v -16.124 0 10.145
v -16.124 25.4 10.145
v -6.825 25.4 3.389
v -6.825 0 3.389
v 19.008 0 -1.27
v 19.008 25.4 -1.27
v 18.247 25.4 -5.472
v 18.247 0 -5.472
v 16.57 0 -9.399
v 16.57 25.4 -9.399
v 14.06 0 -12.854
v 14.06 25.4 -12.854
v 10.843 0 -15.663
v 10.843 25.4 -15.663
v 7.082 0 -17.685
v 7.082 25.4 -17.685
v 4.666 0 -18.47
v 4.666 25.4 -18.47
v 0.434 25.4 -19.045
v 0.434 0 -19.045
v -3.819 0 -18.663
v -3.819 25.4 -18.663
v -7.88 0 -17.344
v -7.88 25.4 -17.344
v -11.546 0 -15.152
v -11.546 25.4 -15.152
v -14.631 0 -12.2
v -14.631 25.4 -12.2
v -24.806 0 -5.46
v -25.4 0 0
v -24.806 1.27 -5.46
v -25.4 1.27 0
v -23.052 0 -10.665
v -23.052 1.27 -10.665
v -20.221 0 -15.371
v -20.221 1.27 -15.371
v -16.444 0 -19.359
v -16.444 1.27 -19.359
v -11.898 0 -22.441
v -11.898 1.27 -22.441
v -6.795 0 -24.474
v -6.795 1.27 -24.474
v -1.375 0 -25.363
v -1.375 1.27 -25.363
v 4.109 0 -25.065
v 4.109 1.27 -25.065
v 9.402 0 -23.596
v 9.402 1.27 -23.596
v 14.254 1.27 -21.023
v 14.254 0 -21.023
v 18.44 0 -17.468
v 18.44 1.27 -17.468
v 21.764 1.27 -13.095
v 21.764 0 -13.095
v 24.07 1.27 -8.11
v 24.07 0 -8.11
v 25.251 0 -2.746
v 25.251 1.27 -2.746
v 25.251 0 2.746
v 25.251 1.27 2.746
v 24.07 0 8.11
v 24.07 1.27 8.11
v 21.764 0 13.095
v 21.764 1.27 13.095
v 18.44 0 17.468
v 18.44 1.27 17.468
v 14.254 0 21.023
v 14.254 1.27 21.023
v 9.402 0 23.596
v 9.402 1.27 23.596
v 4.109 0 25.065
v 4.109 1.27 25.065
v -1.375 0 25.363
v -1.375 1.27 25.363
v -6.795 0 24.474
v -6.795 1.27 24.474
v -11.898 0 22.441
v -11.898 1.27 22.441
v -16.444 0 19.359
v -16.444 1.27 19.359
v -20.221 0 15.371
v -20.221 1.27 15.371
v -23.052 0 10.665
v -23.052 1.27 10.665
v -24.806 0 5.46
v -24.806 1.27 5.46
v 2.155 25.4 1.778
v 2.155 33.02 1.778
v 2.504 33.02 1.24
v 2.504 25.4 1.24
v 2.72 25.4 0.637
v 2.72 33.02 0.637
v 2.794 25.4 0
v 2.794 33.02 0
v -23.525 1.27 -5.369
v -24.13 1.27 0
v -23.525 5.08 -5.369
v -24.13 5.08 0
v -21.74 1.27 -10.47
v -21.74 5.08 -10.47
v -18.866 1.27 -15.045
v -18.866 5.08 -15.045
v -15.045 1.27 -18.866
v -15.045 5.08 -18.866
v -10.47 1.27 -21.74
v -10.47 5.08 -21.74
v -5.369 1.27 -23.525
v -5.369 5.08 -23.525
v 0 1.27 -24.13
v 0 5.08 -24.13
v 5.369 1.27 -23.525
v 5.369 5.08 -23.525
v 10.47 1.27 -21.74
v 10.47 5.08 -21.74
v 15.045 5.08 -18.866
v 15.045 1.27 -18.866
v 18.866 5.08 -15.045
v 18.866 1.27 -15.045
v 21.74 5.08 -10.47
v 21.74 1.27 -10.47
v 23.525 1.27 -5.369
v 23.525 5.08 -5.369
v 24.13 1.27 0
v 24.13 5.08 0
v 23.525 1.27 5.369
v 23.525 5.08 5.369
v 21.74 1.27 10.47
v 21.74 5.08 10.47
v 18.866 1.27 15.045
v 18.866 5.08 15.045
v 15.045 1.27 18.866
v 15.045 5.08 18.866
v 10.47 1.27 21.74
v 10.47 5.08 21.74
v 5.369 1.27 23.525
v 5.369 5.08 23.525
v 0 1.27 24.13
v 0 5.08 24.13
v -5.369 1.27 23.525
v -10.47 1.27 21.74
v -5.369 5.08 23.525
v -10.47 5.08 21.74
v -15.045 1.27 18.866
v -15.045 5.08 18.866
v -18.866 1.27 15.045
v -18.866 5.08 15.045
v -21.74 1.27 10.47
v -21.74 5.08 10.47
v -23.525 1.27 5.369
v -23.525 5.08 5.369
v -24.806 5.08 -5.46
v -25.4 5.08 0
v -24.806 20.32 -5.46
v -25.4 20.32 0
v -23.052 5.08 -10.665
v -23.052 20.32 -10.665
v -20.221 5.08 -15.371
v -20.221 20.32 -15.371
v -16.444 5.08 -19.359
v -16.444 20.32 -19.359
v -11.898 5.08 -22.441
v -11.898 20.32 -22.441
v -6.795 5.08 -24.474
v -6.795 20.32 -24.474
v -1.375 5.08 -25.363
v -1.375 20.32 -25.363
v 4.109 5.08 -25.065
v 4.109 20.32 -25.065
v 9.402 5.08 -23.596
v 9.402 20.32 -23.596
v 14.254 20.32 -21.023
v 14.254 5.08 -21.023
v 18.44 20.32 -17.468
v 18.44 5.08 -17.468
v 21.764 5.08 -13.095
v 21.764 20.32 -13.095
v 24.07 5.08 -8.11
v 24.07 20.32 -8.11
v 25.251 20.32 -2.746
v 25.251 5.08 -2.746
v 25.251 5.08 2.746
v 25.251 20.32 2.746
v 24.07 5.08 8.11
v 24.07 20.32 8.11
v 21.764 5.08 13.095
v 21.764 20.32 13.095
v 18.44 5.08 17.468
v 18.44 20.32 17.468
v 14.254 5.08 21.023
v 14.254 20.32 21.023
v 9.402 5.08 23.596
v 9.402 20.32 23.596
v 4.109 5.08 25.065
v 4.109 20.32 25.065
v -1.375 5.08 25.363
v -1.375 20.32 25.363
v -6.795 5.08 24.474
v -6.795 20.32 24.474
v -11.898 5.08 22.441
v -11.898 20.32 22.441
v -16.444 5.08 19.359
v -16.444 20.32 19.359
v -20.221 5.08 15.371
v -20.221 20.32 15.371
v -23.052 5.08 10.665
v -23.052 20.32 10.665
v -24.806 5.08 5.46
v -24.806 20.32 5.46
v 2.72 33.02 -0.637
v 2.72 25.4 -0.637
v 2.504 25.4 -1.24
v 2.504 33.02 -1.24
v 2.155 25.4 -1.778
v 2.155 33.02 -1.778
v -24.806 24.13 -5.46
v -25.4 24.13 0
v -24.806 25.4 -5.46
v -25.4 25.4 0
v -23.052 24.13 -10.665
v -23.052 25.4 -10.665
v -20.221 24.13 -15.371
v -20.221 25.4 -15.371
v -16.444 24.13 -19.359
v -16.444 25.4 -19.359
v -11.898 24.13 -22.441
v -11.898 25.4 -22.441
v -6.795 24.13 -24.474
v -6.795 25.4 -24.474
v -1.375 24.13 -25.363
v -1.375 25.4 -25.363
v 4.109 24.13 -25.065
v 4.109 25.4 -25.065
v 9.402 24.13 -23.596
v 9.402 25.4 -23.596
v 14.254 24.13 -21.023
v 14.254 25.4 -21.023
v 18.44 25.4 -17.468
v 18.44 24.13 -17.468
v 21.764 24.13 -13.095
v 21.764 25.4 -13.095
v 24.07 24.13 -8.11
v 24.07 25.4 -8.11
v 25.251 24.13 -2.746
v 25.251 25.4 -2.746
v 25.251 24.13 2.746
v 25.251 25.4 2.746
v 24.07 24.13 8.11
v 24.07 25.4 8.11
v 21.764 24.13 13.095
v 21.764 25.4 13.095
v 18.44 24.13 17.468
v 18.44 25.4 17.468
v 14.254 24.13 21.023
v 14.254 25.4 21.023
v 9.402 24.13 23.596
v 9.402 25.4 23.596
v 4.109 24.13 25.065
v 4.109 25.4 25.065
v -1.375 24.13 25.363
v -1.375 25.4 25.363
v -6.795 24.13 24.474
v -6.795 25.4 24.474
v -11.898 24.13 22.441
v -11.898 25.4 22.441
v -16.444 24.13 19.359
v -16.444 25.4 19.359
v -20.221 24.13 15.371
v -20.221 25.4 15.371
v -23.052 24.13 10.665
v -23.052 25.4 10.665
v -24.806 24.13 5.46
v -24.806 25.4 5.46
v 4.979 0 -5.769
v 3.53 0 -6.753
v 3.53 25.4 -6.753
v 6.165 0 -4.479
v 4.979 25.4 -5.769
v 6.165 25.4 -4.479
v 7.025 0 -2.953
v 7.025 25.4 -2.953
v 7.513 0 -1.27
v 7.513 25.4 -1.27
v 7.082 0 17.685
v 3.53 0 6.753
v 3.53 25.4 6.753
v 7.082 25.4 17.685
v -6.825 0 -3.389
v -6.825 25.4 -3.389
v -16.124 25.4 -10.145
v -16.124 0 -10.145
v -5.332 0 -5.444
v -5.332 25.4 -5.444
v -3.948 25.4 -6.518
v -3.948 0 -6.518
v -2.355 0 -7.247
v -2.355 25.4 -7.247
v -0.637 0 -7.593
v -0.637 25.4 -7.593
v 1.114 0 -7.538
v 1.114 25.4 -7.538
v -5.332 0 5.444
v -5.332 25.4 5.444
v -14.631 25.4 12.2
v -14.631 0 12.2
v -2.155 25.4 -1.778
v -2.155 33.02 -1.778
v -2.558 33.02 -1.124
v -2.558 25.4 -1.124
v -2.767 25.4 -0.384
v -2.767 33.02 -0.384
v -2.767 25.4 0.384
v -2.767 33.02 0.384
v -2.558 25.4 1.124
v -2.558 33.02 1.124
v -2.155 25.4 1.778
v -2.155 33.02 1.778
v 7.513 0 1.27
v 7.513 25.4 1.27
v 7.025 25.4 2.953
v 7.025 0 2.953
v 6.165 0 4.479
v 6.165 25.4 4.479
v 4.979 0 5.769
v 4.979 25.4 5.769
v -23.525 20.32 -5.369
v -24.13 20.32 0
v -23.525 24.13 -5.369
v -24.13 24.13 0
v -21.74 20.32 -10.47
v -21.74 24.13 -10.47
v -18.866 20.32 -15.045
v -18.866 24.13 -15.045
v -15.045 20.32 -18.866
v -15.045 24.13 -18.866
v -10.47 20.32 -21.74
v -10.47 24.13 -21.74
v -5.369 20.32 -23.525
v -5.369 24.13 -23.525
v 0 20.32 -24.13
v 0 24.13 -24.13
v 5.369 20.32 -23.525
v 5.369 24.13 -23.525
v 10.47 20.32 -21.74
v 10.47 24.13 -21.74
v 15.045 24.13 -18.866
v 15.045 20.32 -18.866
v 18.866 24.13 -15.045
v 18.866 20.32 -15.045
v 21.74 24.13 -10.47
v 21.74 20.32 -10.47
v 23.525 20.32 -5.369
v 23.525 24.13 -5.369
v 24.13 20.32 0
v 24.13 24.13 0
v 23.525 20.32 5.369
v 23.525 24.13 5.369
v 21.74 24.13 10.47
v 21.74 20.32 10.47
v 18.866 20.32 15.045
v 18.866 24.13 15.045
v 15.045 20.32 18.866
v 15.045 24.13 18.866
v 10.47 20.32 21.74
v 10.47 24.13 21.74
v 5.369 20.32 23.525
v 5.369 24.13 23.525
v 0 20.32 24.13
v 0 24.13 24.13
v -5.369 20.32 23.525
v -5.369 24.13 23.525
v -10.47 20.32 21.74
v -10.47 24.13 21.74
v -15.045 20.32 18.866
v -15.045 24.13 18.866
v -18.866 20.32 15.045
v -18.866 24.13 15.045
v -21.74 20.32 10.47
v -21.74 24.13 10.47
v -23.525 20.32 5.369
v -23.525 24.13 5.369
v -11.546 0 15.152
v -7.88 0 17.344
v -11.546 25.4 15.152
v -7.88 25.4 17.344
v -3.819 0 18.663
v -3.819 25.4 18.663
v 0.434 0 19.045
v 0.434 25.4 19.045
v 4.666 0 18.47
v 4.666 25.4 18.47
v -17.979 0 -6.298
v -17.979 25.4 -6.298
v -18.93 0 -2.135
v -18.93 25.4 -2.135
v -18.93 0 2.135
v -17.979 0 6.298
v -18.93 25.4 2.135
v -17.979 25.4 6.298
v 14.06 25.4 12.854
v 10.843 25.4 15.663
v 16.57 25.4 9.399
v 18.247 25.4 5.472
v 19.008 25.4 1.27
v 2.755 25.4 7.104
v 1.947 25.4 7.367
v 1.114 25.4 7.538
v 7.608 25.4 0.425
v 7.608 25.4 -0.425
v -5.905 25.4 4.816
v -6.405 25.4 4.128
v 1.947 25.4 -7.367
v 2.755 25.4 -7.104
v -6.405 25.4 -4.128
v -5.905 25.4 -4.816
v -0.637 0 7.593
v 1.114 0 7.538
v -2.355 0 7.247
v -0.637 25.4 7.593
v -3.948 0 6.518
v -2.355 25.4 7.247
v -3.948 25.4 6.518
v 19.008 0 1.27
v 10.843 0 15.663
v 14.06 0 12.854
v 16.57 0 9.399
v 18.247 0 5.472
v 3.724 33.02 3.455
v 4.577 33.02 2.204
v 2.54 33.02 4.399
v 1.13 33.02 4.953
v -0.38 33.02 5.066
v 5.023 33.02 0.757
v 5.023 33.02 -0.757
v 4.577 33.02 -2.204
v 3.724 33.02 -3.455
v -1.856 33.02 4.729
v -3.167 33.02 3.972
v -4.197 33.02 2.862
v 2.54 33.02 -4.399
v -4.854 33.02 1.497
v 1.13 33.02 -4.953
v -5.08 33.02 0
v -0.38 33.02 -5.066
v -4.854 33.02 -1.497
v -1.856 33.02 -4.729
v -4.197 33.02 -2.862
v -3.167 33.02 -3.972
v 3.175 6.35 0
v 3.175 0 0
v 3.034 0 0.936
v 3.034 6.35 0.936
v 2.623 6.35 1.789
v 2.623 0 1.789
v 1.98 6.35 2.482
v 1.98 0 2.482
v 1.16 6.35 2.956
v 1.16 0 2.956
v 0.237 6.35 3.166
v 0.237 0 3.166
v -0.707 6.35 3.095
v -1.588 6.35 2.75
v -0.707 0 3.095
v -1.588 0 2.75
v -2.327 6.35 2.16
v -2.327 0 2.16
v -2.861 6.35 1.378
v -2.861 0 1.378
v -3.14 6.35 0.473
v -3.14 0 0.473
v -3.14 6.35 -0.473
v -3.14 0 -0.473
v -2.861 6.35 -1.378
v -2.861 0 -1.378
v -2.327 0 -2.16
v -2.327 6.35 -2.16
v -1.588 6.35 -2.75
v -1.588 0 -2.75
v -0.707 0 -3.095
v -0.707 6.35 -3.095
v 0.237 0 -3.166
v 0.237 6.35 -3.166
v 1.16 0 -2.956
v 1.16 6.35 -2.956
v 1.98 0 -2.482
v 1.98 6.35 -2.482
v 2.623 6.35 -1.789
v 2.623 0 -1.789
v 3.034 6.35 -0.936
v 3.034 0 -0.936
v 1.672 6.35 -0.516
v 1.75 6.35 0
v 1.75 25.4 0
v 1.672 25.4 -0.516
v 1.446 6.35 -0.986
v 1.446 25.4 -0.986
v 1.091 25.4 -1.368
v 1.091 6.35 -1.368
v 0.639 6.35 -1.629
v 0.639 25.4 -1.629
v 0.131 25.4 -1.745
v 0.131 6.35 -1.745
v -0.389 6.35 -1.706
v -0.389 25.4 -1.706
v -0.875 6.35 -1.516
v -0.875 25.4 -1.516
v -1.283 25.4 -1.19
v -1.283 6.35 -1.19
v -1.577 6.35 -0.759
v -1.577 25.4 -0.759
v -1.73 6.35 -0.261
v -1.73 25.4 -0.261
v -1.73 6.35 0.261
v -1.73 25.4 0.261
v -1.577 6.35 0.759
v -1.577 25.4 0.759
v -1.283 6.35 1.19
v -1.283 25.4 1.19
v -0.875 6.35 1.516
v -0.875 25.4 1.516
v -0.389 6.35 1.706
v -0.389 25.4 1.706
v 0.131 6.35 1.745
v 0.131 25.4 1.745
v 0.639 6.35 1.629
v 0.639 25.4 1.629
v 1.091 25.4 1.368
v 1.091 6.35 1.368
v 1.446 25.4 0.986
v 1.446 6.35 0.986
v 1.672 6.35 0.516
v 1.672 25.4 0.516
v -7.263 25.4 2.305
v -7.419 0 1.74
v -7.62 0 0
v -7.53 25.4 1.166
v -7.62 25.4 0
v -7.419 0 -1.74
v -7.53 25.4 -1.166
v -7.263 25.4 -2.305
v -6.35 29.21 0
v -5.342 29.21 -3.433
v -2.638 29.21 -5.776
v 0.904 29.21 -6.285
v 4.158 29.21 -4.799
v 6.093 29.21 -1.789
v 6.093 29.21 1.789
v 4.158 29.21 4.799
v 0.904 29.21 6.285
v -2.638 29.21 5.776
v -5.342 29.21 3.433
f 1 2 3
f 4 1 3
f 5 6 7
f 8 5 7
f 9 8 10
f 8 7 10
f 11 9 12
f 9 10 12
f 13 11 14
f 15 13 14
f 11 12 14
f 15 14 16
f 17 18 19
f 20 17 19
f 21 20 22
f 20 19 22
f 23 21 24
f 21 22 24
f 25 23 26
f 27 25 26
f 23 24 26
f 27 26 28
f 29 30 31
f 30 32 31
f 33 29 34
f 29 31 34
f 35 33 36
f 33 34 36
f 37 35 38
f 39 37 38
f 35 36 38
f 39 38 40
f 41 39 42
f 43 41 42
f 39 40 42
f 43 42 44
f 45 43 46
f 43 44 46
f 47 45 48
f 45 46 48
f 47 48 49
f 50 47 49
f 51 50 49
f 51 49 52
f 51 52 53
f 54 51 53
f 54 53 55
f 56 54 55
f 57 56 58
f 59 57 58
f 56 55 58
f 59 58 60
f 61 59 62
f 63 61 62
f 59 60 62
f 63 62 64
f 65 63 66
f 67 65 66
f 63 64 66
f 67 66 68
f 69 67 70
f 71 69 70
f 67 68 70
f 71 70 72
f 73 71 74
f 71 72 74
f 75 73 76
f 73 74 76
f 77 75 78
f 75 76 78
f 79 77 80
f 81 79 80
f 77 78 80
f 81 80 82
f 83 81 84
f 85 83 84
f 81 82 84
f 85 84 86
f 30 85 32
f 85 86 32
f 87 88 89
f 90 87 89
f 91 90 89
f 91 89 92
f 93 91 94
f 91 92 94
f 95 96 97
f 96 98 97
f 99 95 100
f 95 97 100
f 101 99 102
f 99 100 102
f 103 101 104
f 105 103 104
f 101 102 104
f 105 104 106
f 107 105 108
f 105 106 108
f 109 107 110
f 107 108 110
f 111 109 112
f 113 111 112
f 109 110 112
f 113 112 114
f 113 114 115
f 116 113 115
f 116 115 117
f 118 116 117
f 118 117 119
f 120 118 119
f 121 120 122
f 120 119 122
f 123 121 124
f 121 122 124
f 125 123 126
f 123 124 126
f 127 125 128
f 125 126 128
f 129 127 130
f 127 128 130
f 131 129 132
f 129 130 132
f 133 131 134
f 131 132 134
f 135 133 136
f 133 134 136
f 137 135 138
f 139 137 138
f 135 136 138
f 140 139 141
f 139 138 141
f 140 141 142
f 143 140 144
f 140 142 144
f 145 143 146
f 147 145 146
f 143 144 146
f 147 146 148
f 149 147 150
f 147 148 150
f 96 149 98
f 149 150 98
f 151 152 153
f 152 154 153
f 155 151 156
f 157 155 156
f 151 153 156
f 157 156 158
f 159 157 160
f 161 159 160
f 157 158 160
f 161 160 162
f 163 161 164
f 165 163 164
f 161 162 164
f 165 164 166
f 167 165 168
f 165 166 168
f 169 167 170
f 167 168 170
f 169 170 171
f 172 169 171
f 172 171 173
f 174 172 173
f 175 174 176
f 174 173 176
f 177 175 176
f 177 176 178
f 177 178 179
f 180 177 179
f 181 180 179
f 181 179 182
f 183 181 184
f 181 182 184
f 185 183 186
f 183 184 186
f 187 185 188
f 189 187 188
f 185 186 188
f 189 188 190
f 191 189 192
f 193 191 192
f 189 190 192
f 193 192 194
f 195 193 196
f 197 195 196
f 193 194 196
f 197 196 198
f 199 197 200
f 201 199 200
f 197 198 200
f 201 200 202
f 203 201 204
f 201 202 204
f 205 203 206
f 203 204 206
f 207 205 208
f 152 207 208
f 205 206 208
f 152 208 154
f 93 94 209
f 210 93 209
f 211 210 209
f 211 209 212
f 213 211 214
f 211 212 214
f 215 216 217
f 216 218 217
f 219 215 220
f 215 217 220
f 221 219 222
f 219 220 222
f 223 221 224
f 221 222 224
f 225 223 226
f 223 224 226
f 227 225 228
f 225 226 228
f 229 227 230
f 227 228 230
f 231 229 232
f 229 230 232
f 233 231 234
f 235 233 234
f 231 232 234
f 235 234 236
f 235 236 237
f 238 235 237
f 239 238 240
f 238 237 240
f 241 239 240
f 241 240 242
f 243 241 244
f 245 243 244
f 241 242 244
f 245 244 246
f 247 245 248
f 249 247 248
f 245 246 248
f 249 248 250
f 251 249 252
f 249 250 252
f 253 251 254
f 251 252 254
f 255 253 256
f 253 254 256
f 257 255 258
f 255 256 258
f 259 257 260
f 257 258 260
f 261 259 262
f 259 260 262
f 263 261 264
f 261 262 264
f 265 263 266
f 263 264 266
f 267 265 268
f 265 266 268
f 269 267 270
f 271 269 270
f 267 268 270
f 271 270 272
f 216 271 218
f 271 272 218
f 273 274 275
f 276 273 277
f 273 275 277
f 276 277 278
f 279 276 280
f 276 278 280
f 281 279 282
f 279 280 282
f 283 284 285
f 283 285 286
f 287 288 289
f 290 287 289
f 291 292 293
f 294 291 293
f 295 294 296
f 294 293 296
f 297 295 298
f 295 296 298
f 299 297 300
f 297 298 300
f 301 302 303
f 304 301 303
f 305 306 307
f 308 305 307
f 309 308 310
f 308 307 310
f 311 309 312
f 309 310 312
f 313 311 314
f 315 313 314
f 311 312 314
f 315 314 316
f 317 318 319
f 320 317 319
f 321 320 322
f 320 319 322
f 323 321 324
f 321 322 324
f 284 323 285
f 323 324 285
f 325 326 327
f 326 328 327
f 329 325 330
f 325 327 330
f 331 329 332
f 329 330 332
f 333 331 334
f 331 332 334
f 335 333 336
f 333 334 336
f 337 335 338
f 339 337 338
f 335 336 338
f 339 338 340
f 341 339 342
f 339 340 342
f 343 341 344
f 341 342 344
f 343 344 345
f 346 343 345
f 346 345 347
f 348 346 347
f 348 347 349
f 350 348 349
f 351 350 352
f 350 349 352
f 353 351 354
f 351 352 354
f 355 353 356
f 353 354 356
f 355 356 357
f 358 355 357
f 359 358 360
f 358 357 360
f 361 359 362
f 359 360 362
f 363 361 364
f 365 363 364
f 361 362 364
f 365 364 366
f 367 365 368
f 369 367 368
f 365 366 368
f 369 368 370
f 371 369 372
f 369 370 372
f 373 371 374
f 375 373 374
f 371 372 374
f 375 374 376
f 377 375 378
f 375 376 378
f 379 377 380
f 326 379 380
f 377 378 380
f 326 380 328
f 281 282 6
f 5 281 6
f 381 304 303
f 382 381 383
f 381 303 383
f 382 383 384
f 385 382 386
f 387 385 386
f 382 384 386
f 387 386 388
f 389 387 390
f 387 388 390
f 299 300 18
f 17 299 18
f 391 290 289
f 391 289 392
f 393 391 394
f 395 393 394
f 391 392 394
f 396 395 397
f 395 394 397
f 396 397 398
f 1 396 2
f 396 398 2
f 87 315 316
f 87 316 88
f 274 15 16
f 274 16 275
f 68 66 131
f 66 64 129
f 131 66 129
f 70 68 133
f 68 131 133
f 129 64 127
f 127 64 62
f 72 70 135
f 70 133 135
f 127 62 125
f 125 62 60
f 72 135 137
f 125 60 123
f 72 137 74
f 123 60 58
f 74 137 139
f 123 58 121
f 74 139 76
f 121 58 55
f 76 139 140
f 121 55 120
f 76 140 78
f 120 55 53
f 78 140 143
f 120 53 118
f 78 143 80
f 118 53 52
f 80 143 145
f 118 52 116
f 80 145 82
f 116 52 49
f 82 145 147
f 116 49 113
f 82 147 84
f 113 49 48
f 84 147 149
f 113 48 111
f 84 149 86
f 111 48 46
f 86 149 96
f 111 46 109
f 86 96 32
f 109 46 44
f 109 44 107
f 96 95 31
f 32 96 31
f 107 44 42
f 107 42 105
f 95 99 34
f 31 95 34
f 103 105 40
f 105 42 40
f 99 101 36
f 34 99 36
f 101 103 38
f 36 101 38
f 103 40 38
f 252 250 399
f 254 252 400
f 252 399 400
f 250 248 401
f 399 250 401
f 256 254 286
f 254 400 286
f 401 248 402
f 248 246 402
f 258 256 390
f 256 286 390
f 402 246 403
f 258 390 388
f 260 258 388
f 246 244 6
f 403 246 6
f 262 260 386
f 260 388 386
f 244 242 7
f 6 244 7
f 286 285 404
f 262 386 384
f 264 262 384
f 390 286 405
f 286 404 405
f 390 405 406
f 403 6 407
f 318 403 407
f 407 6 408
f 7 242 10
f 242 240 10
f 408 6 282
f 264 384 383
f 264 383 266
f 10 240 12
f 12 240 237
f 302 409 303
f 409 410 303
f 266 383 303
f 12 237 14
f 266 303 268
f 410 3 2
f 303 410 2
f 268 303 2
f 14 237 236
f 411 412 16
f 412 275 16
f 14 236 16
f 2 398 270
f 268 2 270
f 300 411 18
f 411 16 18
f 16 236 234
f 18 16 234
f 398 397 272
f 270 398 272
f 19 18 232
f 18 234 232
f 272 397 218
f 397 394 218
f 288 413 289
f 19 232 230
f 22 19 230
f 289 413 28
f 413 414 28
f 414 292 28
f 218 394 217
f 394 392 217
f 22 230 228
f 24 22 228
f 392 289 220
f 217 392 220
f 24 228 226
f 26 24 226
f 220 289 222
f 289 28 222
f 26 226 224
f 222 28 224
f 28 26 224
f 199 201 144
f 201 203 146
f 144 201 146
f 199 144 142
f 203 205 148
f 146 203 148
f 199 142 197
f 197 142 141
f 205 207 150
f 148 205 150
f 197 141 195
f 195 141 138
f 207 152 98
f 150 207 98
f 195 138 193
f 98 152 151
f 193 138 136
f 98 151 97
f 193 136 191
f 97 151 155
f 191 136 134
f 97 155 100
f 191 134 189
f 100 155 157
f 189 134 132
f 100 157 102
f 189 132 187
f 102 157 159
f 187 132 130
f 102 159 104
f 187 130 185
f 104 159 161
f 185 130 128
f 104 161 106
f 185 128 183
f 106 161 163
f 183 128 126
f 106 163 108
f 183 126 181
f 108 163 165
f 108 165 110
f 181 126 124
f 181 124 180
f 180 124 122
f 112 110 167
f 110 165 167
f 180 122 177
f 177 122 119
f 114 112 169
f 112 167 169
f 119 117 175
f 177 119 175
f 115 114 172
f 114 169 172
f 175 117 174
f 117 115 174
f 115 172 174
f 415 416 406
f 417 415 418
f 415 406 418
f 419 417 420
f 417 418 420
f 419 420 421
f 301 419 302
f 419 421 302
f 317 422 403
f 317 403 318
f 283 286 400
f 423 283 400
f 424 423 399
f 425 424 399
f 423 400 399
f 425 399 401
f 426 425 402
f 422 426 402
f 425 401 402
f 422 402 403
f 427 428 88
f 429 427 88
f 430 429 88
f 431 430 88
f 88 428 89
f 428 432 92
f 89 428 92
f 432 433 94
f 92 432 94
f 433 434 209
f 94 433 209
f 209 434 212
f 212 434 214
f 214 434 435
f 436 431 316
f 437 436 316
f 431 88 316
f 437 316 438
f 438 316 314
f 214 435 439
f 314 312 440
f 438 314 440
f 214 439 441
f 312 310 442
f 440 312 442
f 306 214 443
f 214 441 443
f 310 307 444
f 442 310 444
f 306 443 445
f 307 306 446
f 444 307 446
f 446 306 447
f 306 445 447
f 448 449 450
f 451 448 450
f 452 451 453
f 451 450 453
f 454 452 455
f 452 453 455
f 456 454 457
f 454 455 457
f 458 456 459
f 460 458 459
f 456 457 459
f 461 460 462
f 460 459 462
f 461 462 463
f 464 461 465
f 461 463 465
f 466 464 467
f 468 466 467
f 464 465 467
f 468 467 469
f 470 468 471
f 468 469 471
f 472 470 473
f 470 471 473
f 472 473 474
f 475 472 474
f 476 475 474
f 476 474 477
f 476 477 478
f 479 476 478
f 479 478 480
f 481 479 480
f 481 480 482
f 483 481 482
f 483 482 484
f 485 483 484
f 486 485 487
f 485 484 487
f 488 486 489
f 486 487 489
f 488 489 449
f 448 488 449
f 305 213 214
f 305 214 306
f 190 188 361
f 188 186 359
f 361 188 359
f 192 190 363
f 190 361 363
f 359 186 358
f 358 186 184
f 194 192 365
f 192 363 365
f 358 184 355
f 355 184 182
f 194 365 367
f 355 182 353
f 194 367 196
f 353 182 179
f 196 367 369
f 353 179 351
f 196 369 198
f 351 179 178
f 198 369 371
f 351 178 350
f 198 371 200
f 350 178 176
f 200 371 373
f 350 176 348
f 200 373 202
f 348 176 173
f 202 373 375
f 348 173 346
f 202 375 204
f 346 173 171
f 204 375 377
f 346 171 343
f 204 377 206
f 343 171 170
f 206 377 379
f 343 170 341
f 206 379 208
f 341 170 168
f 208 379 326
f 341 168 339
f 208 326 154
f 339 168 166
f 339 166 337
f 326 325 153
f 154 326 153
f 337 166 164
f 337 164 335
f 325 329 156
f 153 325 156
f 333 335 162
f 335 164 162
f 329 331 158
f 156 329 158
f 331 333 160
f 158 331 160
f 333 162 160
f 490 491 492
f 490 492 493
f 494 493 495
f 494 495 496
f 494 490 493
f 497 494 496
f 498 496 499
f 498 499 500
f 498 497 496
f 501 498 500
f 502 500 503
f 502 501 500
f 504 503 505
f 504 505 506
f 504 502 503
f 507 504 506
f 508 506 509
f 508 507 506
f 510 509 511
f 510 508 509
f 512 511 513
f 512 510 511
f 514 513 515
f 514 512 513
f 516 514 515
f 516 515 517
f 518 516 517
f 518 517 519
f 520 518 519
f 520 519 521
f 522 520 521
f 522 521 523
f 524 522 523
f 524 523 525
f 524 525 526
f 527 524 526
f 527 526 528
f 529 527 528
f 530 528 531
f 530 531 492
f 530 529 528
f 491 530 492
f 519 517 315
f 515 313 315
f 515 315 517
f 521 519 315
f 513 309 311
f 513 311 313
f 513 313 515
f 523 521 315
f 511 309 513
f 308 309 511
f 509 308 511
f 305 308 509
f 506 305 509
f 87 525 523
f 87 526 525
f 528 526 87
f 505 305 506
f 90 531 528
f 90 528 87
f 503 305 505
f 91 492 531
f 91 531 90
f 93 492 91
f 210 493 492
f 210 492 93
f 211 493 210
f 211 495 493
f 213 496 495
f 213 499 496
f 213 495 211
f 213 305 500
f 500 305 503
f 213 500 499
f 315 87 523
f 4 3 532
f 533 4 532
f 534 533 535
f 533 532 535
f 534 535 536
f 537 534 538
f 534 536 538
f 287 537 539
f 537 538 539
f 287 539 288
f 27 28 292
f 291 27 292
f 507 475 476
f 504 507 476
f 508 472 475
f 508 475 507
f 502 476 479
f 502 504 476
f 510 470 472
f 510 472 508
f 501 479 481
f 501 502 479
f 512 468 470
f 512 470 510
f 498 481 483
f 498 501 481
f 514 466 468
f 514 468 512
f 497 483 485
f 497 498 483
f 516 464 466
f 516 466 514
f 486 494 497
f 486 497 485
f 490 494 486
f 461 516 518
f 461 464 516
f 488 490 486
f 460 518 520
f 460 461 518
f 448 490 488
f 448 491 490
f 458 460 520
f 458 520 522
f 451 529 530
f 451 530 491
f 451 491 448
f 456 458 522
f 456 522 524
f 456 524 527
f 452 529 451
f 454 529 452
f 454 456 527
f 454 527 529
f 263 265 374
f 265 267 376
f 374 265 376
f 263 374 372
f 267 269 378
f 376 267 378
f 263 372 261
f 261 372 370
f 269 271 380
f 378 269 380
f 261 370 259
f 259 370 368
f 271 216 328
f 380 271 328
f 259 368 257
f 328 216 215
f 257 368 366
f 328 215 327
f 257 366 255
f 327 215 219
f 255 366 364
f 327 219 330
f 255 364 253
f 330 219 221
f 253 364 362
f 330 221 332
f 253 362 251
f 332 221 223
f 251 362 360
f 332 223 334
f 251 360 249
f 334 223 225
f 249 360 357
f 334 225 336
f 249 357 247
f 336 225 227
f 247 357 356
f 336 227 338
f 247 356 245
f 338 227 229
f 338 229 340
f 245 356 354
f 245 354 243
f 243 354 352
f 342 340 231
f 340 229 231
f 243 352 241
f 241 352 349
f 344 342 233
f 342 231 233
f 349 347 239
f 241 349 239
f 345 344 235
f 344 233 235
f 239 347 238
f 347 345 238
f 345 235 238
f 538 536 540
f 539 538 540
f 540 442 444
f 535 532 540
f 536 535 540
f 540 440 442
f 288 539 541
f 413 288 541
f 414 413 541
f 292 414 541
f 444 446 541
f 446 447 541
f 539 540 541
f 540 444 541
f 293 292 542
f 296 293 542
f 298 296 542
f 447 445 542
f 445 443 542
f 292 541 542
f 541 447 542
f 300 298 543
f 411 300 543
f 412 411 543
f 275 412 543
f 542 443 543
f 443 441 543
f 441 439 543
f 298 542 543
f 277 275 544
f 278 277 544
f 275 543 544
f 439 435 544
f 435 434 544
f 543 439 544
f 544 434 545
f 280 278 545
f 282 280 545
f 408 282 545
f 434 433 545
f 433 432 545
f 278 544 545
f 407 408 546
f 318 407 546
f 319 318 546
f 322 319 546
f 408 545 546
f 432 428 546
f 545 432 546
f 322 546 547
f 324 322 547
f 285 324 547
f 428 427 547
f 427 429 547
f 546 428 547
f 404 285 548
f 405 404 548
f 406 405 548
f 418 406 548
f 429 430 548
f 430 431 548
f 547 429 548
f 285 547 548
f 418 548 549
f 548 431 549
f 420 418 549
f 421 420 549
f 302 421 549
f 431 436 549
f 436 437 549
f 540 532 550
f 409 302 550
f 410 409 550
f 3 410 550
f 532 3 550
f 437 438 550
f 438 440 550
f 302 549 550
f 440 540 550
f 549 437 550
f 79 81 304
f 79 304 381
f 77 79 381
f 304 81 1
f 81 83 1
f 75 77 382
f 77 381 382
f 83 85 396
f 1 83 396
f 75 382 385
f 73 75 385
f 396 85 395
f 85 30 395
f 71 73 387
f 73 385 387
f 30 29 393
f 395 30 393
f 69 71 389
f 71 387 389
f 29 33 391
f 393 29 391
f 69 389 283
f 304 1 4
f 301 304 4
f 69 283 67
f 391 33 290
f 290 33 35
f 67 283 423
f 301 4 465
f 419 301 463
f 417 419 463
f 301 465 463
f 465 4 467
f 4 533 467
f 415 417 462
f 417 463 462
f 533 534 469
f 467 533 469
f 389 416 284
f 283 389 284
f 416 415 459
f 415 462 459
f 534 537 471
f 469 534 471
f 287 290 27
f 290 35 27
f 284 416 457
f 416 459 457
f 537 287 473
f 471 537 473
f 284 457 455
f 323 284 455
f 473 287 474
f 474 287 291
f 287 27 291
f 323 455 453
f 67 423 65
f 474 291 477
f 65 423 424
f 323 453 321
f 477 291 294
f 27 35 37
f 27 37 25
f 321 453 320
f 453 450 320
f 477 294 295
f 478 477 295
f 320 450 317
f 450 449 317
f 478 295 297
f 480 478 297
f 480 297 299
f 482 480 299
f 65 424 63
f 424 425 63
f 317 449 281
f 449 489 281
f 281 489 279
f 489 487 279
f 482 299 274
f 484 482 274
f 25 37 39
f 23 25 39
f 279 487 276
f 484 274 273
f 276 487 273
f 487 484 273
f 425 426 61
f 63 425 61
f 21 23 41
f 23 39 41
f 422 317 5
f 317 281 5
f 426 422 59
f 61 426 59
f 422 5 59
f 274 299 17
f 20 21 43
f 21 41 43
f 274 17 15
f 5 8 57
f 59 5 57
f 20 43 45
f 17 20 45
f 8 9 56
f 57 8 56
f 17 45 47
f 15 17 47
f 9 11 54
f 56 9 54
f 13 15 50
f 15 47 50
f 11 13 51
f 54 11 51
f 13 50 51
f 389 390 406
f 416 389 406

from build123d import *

# Parameters (mm, degrees)
SKETCH2_R              = 3.175
CUT_EXTRUDE1_DEPTH     = 6.35
CUT_EXTRUDE2_START     = 6.35
CUT_EXTRUDE2_OUTLINE_R = 1.75
CUT_EXTRUDE2_DEPTH     = 19.05
CUT_EXTRUDE3_DEPTH     = 7.62
CUT_EXTRUDE4_DEPTH     = 44.994090512


# Read off the part's stored shape, not the designer's step: Cut-Extrude2
with BuildPart() as part:
    # Sketch1 → Revolve1 (revolve)
    with BuildSketch(Plane.XY, mode=Mode.PRIVATE) as revolve1_sk:
        Polygon((0, 33.02), (0, 25.4), (7.62, 25.4), (5.08, 33.02), align=None)
        Polygon((0, 25.4), (0, 12.7), (25.4, 12.7), (25.4, 20.32), (24.13, 20.32), (24.13, 24.13), (25.4, 24.13), (25.4, 25.4), (7.62, 25.4), align=None)
        Polygon((0, 12.7), (0, 0), (25.4, 0), (25.4, 1.27), (24.13, 1.27), (24.13, 5.08), (25.4, 5.08), (25.4, 12.7), align=None)
    revolve(revolve1_sk.sketch.rotate(Axis((0, 25.4, 0), (0, -1, 0)), 180), axis=Axis((0, 25.4, 0), (0, -1, 0)))

    # Sketch2 → Cut-Extrude1 (cut)
    with BuildSketch(Plane(origin=(0, 0, 0), x_dir=(-1, 0, 0), z_dir=(0, -1, 0))):
        with Locations(Location((0, 0, 0), (0, 0, 180))):
            Circle(SKETCH2_R)
    extrude(amount=-CUT_EXTRUDE1_DEPTH, mode=Mode.SUBTRACT)

    # Cut-Extrude2 outline → Cut-Extrude2 (cut)
    with BuildSketch(Plane(origin=(0, 0, 0), x_dir=(1, 0, 0), z_dir=(0, 1, 0)).offset(CUT_EXTRUDE2_START)):
        Circle(CUT_EXTRUDE2_OUTLINE_R)
    extrude(amount=CUT_EXTRUDE2_DEPTH, mode=Mode.SUBTRACT)

    # Sketch3 → Cut-Extrude3 (cut)
    with BuildSketch(Plane(origin=(0, 33.02, 0), x_dir=(1, 0, 0), z_dir=(0, 1, 0))):
        with BuildLine():
            Line((2.155261469, 1.778), (-2.155261469, 1.778))
            ThreePointArc((-2.155261469, 1.778), (-2.794, 0), (-2.155261469, -1.778))
            Line((-2.155261469, -1.778), (2.155261469, -1.778))
            ThreePointArc((2.155261469, -1.778), (2.629471101, -0.944625708), (2.794, 0))
            ThreePointArc((2.794, 0), (2.629471101, 0.944625708), (2.155261469, 1.778))
        make_face()
    extrude(amount=-CUT_EXTRUDE3_DEPTH, mode=Mode.SUBTRACT)

    # Sketch4 → Cut-Extrude4 (cut, through all)
    with BuildSketch(Plane(origin=(0, 25.4, 0), x_dir=(1, 0, 0), z_dir=(0, 1, 0))):
        with BuildLine():
            ThreePointArc((-5.331998267, 5.443729832), (-2.354709497, 7.247050654), (1.113933099, 7.538139893))
            Line((1.113933099, 7.538139893), (4.66583568, 18.469771991))
            ThreePointArc((4.66583568, 18.469771991), (-5.886773743, 18.117626635), (-14.630999948, 12.199850021))
            Line((-14.630999948, 12.199850021), (-5.331998267, 5.443729832))
        make_face()
        with BuildLine():
            Line((-16.123974489, -10.144946855), (-6.824972808, -3.388826666))
            ThreePointArc((-6.824972808, -3.388826666), (-7.62, 0), (-6.824972808, 3.388826666))
            Line((-6.824972808, 3.388826666), (-16.123974489, 10.144946855))
            ThreePointArc((-16.123974489, 10.144946855), (-19.05, 0), (-16.123974489, -10.144946855))
        make_face()
        with BuildLine():
            Line((4.66583568, -18.469771991), (1.113933099, -7.538139893))
            ThreePointArc((1.113933099, -7.538139893), (-2.354709497, -7.247050654), (-5.331998267, -5.443729832))
            Line((-5.331998267, -5.443729832), (-14.630999948, -12.199850021))
            ThreePointArc((-14.630999948, -12.199850021), (-5.886773743, -18.117626635), (4.66583568, -18.469771991))
        make_face()
        with BuildLine():
            Line((19.007619525, -1.27), (7.513421325, -1.27))
            ThreePointArc((7.513421325, -1.27), (6.164709497, -4.478923622), (3.529616651, -6.753236728))
            Line((3.529616651, -6.753236728), (7.081519231, -17.684868825))
            ThreePointArc((7.081519231, -17.684868825), (15.411773743, -11.197309056), (19.007619525, -1.27))
        make_face()
        with BuildLine():
            ThreePointArc((3.529616651, 6.753236728), (6.164709497, 4.478923622), (7.513421325, 1.27))
            Line((7.513421325, 1.27), (19.007619525, 1.27))
            ThreePointArc((19.007619525, 1.27), (15.411773743, 11.197309056), (7.081519231, 17.684868825))
            Line((7.081519231, 17.684868825), (3.529616651, 6.753236728))
        make_face()
    extrude(amount=-CUT_EXTRUDE4_DEPTH, mode=Mode.SUBTRACT)


solid = part.part
